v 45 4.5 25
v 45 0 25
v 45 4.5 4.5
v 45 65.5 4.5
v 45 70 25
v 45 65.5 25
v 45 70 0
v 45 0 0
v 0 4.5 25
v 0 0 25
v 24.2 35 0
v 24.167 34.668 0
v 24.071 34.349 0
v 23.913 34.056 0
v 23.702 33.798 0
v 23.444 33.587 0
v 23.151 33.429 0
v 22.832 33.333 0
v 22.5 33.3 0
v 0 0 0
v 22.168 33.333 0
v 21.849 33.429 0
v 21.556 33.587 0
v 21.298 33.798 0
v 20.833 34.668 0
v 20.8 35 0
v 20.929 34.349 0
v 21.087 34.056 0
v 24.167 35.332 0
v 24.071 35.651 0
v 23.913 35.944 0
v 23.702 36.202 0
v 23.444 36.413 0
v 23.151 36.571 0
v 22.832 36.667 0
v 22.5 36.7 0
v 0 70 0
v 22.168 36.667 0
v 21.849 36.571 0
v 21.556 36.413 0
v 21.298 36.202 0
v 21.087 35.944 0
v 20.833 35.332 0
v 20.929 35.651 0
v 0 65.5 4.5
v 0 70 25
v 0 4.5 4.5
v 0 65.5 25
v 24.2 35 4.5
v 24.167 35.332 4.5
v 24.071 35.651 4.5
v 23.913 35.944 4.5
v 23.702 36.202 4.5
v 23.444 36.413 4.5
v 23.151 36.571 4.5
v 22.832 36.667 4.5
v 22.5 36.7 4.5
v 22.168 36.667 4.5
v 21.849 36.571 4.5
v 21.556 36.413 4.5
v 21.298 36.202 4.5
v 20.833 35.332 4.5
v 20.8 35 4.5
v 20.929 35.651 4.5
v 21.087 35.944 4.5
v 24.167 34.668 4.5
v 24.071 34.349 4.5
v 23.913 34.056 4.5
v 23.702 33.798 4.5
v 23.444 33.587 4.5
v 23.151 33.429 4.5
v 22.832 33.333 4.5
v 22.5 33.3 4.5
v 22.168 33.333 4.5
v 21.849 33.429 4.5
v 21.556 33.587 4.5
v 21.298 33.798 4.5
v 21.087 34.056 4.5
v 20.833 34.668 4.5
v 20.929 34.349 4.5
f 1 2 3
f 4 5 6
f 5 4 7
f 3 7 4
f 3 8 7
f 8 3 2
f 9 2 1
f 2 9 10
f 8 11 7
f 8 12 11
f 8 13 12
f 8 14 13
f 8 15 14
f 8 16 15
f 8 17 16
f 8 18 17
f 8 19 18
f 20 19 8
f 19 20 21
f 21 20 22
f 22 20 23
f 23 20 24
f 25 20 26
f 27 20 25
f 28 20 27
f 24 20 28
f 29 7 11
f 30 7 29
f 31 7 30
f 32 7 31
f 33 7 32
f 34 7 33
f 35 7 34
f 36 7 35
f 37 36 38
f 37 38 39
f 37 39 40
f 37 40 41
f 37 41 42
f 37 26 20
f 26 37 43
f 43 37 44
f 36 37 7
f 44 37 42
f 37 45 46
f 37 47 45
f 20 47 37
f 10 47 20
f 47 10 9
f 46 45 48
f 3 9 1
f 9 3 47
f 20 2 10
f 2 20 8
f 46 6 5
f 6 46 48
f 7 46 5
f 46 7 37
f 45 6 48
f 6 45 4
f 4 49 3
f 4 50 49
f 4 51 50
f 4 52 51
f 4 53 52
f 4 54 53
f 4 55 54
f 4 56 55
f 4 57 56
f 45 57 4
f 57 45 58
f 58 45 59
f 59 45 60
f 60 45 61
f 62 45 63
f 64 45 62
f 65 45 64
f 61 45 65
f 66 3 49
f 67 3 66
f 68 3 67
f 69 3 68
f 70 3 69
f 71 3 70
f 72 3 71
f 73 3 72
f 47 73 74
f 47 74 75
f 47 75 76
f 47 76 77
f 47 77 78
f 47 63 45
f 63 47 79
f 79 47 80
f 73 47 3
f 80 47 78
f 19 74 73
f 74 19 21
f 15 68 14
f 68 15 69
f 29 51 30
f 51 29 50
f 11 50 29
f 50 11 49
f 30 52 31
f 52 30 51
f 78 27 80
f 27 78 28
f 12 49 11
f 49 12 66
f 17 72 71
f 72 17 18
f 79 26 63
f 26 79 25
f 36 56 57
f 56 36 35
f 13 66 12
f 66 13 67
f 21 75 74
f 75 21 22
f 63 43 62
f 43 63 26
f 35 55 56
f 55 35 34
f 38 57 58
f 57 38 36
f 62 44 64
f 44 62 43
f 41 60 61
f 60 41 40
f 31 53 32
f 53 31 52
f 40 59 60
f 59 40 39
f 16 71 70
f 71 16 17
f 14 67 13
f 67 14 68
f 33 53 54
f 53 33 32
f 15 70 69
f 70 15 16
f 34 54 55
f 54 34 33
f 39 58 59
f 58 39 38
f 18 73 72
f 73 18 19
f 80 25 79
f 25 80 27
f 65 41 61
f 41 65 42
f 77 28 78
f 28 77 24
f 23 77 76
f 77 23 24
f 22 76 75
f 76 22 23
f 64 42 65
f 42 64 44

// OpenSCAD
$fn = 32;

// ----------------------------------------------------------------------
// U-bracket: 45 x 70 x 25 mm
// ----------------------------------------------------------------------

// --- parameters (mm) ---
length = 45;              // outer length, X
width = 70;               // outer width, Y
height = 25;              // upright height, Z
thick = 4.5;              // wall thickness
hole_d = 3.4;             // clearance for M3

module hole_z(px, py) {
  translate([px, py, -0.5]) cylinder(h = thick + 1, d = hole_d);
}
module hole_y_pz(pz) {
  /* through both uprights along Y */
  translate([0, -0.5, pz]) rotate([-90, 0, 0]) cylinder(h = width + 1, d = hole_d);
}

module base() {
  cube([length, width, thick]);
}

module uprights() {
  cube([length, thick, height]);
  translate([0, width - thick, 0]) cube([length, thick, height]);
}

difference() {
  union() {
    base();
    uprights();
  }
  hole_z(22.5, 35);
}
